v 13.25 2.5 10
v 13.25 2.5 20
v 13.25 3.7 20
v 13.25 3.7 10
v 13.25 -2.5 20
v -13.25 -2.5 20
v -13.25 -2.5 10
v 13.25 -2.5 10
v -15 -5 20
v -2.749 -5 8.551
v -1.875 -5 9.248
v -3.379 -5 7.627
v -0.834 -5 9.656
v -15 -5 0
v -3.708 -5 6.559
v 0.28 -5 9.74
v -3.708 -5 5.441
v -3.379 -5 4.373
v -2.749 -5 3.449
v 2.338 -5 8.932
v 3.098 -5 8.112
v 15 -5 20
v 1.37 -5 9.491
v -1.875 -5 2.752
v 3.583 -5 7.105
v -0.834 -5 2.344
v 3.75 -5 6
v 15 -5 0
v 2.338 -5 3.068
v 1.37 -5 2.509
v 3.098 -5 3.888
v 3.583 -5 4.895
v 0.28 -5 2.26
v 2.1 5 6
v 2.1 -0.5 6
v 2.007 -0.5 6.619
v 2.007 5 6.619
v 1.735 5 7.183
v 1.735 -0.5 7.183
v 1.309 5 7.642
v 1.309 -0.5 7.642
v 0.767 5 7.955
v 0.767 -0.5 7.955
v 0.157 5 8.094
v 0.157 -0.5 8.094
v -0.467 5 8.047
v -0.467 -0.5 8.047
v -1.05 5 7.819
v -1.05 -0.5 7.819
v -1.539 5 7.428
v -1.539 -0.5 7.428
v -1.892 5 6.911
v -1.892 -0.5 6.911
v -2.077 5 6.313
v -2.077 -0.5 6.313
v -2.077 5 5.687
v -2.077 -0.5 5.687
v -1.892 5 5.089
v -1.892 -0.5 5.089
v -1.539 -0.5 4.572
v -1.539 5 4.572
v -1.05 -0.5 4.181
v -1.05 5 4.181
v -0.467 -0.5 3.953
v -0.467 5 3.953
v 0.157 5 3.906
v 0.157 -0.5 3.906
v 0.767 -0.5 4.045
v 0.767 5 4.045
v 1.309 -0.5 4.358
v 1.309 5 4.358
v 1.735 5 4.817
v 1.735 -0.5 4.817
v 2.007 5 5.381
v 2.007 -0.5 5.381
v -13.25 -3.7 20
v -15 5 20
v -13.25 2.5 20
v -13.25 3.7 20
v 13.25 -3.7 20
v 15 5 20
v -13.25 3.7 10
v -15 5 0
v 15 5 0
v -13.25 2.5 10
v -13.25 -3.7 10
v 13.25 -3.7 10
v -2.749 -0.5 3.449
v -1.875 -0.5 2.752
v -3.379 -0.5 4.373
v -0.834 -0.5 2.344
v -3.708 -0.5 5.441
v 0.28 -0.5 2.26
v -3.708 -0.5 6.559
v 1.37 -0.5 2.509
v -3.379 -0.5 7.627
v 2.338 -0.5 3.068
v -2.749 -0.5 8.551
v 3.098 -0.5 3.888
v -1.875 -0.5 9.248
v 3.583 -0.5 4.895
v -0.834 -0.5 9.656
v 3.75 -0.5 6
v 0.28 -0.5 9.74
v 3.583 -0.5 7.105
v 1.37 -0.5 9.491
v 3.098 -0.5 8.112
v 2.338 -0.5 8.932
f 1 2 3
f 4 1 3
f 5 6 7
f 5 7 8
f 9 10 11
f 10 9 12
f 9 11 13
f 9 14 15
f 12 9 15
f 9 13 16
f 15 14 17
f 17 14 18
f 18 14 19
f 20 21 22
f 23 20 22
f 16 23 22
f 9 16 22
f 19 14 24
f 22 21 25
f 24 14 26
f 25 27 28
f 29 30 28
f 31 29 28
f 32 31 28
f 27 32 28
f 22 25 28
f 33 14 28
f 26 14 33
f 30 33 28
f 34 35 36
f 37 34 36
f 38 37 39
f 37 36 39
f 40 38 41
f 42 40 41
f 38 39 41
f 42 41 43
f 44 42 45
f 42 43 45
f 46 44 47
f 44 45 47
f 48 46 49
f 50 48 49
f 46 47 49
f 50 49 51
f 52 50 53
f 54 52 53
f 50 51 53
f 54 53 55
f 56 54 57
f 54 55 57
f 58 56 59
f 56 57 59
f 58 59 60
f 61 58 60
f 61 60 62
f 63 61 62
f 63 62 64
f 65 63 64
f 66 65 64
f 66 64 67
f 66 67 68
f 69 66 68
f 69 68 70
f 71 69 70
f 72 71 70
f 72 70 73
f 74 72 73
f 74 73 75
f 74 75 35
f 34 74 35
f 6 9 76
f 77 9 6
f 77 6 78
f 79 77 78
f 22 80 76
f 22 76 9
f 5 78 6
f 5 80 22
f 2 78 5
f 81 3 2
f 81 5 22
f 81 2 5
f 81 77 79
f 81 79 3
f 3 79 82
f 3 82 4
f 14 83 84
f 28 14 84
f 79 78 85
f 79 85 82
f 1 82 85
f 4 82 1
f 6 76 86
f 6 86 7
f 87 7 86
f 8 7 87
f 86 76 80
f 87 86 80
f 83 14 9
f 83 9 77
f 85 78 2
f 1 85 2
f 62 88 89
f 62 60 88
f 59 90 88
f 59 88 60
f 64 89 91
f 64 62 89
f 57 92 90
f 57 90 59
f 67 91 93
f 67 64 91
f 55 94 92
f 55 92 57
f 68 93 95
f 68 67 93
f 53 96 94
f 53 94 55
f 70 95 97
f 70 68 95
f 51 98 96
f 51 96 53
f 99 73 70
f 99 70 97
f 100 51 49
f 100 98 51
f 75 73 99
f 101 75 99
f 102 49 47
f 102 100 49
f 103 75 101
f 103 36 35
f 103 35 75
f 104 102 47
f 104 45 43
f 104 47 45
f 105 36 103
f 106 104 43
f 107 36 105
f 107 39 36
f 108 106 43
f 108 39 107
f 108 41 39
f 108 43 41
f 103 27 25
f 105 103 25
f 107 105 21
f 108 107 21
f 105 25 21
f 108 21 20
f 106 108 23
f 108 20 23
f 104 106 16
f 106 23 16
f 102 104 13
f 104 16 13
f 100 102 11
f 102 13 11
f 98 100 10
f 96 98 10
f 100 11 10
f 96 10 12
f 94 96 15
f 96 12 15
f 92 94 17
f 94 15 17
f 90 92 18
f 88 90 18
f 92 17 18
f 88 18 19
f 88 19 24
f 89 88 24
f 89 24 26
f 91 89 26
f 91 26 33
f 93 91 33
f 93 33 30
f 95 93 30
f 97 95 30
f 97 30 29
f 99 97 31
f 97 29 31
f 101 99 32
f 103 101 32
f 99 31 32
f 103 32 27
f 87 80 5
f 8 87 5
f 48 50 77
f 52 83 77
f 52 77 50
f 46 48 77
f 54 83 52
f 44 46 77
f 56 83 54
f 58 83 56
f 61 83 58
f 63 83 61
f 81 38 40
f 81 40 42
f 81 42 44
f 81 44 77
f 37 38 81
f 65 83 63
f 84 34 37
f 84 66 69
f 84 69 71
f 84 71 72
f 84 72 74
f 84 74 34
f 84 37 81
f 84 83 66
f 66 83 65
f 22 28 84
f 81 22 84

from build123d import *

# Parameters (mm, degrees)
F0_W     = 30
F0_H     = 10
F1_DEPTH = 20
F2_R     = 2.1
F3_DEPTH = 10
F4_W     = 26.5
F4_H     = 1.2
F5_DEPTH = 10
F6_R     = 3.75
F7_DEPTH = 4.5


with BuildPart() as f1:
    # F0 (on Top) → F1 (new body)
    with BuildSketch(Plane.XY):
        Rectangle(F0_W, F0_H)
    extrude(amount=F1_DEPTH)

    # F2 (on face) → F3 (cut, through all)
    with BuildSketch(Plane.XZ.offset(5)):
        with Locations((0, 6)):
            Circle(F2_R)
    extrude(amount=-F3_DEPTH, mode=Mode.SUBTRACT)

    # F4 (on face) → F5 (cut)
    with BuildSketch(Plane.XY.offset(20)):
        with Locations((0, 3.1)):
            Rectangle(F4_W, F4_H)
        with Locations((0, -3.1)):
            Rectangle(F4_W, F4_H)
    extrude(amount=-F5_DEPTH, mode=Mode.SUBTRACT)

    # F6 (on face) → F7 (cut)
    with BuildSketch(Plane.XZ.offset(5)):
        with Locations((0, 6)):
            Circle(F6_R)
    extrude(amount=-F7_DEPTH, mode=Mode.SUBTRACT)


solid = f1.part
